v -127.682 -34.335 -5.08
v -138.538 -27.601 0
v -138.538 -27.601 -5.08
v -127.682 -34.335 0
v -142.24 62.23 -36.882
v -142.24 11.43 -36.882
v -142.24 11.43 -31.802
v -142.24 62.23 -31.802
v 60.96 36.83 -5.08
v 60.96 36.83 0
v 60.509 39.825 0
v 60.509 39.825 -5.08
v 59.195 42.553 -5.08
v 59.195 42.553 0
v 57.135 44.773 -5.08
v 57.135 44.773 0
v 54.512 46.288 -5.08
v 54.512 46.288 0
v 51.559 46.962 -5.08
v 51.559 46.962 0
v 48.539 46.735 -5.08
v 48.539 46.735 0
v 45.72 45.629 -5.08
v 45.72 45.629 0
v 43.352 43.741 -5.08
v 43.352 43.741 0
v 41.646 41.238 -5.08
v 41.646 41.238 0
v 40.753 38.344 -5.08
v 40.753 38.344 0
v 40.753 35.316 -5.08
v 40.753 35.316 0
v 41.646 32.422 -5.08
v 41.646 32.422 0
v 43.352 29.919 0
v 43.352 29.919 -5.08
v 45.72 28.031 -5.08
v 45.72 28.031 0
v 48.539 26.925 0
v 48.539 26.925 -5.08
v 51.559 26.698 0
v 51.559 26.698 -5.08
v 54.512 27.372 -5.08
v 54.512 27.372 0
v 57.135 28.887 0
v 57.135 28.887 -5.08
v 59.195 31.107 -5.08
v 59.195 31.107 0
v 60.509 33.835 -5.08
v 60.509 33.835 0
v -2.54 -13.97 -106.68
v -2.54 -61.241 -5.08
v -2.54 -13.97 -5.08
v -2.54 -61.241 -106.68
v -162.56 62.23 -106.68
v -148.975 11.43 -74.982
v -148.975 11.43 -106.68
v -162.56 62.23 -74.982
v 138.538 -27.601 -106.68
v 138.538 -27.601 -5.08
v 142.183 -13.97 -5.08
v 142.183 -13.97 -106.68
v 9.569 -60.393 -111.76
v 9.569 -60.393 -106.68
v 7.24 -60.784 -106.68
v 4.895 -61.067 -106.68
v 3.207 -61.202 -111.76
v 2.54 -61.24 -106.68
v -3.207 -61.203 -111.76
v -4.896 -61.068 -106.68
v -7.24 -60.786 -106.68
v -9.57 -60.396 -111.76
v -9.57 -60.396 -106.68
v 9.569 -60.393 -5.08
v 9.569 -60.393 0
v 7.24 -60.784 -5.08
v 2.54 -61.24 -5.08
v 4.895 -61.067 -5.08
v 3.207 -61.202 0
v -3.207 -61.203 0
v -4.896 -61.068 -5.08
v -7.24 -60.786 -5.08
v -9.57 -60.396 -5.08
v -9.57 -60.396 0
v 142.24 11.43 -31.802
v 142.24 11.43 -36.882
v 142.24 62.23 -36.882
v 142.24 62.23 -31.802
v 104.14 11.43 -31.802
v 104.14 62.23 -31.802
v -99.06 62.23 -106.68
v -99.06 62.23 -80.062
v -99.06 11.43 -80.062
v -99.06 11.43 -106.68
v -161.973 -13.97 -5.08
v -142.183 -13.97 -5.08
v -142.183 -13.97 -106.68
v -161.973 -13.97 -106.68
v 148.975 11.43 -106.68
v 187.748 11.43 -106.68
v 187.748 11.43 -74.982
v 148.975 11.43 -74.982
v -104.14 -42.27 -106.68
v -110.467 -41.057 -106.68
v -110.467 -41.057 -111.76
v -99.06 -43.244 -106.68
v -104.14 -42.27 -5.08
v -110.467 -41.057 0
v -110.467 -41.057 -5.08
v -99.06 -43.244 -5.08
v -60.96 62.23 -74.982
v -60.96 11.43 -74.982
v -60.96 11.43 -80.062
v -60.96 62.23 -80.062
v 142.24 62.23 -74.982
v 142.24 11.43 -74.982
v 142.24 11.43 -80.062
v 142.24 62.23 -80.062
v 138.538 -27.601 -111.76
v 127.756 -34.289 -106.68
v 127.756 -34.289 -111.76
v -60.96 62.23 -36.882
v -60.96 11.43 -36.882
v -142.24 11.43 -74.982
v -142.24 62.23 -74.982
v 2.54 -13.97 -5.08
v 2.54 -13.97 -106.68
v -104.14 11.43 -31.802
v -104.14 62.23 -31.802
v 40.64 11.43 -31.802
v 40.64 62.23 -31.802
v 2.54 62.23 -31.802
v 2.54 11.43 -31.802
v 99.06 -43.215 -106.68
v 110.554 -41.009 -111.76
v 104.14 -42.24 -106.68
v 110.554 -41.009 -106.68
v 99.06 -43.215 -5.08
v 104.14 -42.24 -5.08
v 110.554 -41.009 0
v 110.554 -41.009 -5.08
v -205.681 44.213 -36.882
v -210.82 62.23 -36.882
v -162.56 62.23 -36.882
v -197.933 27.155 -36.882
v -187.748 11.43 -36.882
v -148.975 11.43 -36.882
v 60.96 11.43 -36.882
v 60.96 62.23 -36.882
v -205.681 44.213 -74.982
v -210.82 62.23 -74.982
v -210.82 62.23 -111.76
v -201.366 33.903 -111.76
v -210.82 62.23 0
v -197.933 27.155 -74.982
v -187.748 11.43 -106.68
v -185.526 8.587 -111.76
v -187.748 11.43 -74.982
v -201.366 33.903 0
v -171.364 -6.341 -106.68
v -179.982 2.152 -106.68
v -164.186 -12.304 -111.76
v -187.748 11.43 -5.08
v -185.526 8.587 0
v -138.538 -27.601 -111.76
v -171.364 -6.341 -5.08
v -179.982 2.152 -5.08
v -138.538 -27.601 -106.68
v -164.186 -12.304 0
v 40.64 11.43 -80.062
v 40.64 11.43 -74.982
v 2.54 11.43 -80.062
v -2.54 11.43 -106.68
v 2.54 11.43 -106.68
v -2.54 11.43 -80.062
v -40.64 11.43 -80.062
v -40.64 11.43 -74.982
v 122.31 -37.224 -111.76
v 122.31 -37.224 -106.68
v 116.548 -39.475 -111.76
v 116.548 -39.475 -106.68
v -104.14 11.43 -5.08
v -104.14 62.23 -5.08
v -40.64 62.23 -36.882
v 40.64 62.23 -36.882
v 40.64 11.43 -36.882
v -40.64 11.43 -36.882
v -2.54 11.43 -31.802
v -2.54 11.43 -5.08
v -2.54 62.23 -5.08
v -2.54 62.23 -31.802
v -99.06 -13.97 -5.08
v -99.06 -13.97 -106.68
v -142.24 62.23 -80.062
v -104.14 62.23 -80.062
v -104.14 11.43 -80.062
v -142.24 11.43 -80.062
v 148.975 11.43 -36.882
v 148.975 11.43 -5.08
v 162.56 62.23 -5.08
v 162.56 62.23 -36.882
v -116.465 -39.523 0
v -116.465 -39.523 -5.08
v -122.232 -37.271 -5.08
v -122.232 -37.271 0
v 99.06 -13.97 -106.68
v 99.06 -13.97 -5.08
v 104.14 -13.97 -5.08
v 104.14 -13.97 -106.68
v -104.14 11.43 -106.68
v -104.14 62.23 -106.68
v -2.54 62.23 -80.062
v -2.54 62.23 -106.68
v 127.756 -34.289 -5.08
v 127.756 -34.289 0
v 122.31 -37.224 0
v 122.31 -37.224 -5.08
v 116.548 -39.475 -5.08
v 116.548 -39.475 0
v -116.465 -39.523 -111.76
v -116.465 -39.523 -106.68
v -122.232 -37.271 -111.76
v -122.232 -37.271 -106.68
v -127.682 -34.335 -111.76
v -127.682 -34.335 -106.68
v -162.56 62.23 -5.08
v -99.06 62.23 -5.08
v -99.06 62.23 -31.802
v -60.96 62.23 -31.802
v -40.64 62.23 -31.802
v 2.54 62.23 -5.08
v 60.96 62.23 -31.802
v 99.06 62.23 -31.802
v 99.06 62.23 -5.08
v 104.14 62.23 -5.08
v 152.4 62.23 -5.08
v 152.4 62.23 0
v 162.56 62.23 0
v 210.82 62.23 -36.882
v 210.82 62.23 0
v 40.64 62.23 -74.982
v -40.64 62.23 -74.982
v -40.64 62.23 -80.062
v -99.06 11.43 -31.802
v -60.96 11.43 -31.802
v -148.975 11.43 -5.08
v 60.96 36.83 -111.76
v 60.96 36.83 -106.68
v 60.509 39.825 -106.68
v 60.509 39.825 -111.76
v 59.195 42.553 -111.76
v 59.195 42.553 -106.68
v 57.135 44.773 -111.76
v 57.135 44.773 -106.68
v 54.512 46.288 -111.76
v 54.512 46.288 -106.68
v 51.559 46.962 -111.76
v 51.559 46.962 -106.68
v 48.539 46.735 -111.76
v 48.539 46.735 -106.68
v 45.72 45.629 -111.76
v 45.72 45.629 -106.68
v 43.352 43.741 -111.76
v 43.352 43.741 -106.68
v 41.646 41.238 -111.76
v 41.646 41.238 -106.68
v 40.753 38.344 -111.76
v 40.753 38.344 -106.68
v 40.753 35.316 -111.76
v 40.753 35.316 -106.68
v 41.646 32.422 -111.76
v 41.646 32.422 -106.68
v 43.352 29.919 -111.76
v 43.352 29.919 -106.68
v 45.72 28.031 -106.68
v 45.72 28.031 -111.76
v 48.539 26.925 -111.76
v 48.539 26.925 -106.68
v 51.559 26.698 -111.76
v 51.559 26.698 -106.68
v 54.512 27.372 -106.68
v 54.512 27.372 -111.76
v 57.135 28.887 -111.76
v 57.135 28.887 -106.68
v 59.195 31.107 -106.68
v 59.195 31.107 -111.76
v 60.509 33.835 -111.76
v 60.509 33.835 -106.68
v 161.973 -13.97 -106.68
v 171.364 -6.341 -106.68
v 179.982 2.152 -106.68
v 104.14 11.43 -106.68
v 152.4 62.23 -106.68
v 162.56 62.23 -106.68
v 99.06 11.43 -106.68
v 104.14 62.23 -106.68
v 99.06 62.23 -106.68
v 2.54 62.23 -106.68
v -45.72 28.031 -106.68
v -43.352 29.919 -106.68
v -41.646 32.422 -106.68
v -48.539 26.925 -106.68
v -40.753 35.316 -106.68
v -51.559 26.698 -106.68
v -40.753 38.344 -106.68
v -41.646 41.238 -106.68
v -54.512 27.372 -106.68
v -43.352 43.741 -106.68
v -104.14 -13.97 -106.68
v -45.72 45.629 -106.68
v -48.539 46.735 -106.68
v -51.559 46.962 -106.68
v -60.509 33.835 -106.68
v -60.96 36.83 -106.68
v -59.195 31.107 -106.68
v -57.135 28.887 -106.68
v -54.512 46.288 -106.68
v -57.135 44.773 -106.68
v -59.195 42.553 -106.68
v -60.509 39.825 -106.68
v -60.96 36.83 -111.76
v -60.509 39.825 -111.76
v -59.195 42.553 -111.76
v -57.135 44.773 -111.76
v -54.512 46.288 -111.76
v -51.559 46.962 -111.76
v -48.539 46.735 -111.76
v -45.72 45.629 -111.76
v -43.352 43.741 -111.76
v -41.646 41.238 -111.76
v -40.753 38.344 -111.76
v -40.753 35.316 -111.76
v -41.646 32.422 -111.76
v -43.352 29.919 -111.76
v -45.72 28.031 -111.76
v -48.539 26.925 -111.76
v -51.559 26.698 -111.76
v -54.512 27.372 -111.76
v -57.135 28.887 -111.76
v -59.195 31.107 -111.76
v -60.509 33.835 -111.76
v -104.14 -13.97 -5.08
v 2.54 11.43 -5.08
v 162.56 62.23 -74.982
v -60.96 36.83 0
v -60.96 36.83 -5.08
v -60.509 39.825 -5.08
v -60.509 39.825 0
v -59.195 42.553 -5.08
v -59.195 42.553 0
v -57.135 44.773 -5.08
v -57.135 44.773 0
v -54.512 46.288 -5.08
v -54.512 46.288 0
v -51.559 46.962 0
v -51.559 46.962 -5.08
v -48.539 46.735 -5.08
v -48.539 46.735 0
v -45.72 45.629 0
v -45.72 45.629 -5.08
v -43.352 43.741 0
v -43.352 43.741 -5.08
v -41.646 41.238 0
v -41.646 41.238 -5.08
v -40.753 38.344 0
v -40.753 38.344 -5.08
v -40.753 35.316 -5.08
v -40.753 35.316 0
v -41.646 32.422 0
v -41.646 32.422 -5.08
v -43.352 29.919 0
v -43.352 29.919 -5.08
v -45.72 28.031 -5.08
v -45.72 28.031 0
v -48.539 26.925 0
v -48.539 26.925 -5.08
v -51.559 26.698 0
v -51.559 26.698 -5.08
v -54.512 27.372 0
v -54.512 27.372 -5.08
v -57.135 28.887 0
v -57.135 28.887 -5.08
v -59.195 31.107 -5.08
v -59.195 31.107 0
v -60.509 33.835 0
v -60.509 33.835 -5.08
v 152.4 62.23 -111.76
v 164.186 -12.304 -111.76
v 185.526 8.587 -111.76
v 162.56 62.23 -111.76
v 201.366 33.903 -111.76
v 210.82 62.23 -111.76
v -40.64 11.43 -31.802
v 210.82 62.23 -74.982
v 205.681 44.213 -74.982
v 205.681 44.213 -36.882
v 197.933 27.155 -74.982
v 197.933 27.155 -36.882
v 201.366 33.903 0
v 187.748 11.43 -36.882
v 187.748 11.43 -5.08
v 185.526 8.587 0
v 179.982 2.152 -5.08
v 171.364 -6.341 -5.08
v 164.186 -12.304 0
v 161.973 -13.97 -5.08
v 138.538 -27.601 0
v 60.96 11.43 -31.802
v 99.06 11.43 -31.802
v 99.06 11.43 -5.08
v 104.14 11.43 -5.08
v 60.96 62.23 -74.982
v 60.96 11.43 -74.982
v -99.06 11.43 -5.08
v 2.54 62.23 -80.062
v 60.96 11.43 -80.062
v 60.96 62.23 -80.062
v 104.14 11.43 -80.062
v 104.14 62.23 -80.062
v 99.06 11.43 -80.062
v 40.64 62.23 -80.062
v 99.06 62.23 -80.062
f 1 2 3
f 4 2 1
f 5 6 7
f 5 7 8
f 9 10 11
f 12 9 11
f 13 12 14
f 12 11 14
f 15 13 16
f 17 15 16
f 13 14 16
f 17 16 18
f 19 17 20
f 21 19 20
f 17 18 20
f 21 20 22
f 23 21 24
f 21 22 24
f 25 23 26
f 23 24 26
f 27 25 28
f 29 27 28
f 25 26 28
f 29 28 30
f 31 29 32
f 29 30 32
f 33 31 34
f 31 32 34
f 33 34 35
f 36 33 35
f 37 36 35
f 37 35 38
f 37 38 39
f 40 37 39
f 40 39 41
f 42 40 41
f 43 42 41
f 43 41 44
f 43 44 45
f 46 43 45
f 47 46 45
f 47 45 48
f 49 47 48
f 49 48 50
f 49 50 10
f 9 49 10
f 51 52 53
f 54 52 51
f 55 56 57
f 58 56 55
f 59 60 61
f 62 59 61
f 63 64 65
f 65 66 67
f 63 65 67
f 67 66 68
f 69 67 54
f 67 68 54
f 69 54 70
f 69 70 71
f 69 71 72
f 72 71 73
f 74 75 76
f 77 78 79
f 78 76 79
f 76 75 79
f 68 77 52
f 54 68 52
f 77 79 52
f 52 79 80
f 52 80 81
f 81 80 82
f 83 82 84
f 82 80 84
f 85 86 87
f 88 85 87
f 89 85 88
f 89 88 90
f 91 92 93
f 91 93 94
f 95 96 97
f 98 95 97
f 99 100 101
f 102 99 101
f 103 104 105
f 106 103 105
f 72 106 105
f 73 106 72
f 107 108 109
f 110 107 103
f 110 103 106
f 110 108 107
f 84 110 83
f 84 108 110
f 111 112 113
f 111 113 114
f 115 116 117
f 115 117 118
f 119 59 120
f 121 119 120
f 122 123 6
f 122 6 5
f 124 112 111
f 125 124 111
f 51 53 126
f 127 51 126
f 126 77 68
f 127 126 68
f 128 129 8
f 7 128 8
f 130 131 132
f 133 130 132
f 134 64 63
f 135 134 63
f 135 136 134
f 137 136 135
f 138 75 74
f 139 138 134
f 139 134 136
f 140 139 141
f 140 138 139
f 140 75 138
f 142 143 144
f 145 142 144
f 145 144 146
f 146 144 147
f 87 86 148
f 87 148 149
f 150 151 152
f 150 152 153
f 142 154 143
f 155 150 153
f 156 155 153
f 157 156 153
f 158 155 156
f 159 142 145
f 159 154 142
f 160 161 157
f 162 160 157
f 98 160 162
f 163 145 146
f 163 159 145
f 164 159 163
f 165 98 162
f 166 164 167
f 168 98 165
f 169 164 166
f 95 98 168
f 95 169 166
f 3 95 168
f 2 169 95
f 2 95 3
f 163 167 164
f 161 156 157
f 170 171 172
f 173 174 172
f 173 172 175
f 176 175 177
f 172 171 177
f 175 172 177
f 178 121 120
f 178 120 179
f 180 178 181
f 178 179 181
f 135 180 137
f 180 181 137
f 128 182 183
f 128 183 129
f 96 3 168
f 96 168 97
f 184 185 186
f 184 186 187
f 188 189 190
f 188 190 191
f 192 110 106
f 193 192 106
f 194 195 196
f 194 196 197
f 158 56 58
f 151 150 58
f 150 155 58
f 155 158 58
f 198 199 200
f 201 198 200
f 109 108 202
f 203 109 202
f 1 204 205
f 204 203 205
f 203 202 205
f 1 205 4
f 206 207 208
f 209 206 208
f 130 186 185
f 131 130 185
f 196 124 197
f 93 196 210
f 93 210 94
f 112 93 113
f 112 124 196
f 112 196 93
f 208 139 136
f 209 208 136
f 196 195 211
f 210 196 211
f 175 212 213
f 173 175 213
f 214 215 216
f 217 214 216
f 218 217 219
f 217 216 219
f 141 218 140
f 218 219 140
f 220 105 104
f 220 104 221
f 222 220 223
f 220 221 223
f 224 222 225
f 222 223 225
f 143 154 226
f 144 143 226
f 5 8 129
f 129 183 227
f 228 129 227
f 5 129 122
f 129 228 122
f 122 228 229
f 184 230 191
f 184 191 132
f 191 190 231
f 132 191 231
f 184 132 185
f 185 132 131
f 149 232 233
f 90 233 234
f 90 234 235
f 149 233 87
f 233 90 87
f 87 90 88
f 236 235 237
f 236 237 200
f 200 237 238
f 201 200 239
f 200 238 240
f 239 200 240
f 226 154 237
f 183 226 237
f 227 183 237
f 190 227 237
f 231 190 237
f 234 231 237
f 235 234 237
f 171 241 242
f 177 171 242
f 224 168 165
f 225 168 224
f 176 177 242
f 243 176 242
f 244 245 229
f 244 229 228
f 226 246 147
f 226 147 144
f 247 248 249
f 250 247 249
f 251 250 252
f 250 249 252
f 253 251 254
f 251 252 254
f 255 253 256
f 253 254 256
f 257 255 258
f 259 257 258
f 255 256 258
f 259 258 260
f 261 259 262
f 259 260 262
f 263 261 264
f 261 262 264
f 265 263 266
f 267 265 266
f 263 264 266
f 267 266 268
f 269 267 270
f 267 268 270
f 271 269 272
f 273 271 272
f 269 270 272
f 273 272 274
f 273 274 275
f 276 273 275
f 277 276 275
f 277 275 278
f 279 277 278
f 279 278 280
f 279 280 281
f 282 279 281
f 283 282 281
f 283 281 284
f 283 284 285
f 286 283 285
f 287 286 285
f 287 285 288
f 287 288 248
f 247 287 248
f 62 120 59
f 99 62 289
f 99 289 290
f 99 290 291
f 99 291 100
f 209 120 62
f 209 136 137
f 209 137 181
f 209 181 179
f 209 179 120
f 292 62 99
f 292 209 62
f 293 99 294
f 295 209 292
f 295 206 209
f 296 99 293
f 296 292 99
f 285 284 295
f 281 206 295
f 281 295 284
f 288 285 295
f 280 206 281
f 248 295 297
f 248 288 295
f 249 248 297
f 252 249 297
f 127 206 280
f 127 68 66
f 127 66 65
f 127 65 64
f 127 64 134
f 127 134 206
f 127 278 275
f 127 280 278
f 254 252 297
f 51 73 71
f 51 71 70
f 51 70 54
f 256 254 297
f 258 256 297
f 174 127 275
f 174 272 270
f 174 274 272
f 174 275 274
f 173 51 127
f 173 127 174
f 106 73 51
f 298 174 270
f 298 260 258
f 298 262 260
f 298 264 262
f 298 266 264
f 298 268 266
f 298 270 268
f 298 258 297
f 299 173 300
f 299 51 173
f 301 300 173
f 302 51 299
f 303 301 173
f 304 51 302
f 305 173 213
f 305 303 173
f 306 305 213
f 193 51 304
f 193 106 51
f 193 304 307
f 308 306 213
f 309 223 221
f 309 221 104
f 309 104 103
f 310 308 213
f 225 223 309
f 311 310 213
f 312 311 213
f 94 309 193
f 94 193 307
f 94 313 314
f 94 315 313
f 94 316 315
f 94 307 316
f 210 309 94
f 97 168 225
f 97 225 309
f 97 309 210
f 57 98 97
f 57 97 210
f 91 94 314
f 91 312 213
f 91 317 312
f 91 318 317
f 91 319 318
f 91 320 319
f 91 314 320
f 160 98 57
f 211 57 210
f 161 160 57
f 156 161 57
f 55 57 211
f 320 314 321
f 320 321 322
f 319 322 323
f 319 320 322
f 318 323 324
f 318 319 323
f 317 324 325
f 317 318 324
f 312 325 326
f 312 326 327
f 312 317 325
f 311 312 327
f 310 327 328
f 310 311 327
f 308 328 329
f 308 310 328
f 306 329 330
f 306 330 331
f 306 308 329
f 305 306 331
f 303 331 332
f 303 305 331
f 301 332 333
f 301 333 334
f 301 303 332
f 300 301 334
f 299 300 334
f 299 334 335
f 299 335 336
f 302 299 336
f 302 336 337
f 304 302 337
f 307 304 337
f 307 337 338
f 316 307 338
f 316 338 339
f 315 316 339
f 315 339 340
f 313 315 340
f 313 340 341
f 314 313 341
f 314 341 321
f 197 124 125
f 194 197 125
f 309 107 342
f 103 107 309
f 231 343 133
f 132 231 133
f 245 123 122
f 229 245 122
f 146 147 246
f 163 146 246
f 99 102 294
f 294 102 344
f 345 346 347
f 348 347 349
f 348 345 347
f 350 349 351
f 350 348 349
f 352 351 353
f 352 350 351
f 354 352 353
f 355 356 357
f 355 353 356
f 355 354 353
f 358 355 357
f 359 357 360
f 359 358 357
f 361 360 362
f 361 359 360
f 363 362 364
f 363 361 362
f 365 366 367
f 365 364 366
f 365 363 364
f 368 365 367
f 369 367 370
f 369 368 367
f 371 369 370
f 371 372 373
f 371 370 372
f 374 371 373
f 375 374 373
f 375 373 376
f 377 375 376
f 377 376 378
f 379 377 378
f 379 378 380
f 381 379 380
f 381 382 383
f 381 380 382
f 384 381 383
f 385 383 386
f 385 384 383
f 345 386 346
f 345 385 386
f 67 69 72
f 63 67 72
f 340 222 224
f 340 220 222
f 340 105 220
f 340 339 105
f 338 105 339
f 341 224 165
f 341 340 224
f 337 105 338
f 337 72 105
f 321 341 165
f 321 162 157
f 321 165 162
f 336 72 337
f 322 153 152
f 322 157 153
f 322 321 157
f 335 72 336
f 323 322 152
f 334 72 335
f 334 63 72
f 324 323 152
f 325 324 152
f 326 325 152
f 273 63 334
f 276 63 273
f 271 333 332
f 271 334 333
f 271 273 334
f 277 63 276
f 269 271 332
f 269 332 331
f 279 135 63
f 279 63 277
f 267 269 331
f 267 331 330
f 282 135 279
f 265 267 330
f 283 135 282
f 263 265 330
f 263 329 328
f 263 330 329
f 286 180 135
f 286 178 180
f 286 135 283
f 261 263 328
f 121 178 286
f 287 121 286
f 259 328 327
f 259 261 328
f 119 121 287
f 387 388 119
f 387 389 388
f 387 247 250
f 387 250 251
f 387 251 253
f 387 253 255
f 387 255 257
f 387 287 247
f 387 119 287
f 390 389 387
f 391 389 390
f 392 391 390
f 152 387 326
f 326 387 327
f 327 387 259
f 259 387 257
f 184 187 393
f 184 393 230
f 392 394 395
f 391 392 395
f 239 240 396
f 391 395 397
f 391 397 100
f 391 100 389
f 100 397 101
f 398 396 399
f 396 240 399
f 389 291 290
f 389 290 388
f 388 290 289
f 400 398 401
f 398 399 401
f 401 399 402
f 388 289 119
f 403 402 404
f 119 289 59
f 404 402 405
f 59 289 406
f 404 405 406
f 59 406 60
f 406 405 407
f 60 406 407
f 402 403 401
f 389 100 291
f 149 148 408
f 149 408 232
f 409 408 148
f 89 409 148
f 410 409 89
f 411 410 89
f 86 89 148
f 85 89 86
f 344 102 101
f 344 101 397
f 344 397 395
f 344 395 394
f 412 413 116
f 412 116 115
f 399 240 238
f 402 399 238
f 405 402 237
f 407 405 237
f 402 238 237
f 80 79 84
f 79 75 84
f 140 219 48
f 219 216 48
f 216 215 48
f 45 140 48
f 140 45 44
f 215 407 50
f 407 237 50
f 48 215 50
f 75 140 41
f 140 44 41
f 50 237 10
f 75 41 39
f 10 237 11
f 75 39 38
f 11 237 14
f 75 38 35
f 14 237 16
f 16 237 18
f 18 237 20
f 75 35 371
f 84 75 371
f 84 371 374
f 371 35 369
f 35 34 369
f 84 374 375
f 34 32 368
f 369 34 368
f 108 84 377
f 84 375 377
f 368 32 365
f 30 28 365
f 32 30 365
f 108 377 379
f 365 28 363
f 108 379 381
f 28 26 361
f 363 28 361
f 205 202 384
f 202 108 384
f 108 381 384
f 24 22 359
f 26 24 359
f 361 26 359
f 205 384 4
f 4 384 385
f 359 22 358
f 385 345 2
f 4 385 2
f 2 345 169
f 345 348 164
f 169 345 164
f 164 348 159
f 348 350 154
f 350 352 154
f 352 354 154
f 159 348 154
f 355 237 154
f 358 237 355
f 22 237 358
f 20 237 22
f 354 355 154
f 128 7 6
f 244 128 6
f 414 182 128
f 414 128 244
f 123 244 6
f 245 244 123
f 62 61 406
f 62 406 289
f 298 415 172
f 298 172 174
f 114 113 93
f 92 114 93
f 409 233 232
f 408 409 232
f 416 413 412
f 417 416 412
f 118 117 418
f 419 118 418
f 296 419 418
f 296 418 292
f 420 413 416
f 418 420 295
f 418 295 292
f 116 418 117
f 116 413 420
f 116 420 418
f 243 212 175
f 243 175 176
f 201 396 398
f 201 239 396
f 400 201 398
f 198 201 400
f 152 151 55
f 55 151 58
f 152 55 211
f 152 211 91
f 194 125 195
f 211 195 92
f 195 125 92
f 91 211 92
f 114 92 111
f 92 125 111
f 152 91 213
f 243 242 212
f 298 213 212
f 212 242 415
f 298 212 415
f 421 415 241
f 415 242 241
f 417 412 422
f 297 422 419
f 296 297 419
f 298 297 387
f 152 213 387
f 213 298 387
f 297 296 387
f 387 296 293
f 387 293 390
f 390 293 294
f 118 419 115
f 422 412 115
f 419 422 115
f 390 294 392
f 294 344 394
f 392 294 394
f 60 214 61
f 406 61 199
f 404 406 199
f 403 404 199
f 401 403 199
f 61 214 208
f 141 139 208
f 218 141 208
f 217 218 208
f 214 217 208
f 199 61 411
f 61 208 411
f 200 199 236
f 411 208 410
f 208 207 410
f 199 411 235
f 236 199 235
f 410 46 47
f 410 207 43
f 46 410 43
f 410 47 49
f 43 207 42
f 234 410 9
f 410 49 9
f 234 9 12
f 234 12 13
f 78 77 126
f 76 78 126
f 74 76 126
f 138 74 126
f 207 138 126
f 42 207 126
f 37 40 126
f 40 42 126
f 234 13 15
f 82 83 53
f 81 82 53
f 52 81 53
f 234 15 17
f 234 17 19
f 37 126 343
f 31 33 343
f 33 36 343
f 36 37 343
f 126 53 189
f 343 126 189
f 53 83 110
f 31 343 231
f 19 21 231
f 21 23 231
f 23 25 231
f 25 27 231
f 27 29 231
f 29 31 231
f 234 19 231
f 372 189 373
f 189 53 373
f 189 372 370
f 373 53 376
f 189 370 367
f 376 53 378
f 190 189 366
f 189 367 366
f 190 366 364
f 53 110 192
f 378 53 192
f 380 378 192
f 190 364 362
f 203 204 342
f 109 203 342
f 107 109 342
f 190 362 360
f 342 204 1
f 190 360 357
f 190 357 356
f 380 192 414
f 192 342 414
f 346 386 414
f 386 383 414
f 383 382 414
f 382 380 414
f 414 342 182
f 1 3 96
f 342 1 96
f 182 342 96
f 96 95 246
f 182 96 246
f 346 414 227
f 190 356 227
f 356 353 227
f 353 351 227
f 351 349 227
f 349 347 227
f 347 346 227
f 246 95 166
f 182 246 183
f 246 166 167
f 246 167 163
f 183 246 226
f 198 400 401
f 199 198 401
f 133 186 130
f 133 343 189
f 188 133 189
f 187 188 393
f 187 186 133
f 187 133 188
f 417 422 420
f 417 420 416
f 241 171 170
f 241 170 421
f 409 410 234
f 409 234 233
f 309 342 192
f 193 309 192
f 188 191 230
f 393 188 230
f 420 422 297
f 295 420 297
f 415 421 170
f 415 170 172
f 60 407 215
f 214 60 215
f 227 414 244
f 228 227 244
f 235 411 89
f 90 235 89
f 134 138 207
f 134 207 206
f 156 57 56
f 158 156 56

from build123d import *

# Parameters (mm, degrees)
BOSS_EXTRUDE1_DEPTH                 = 111.76
SKETCH5_W                           = 304.8
SKETCH5_H                           = 25.4
CUT_EXTRUDE3_DEPTH                  = 101.6
CUT_EXTRUDE4_DEPTH                  = 227.288199427
CUT_EXTRUDE4_DEPTH_BACK             = 227.288199427
SKETCH3_W                           = 96.52
SKETCH3_H                           = 101.6
SKETCH3_W_2                         = 48.26
CUT_EXTRUDE5_REACH                  = 288.663
SKETCH6_W                           = 38.1
SKETCH6_H                           = 50.8
SKETCH7_W                           = 81.28
SKETCH7_H                           = 50.8
BOSS_EXTRUDE2_DEPTH                 = 5.08
CUT_EXTRUDE6_REACH                  = 200.969
SKETCH8_R                           = 10.16
SKETCH9_W                           = 5.08
SKETCH9_H                           = 95.25
BOSS_EXTRUDE3_DEPTH                 = 10.16
SKETCH10_W                          = 5.08
SKETCH10_H                          = 95.206439839
BOSS_EXTRUDE4_DEPTH                 = 10.16
CUT_EXTRUDE7_REACH                  = 208.854
FILLET1_R                           = 50.8
BOSS_EXTRUDE5_REACH                 = 208.854
CUT_EXTRUDE8_REACH                  = 248.593
CUT_EXTRUDE8_END_RADIUS             = 126.32098656
CUT_EXTRUDE8_DIRECTION_2_REACH      = 248.593
CUT_EXTRUDE8_DIRECTION_2_END_RADIUS = 126.32098656


with BuildPart() as part:
    # Sketch1 → Boss-Extrude1 (new body)
    with BuildSketch(Plane.XY):
        Polygon((-152.4, 62.23), (-152.4, -33.02), (0, -62.23), (152.4, -32.976439839), (152.4, 62.23), align=None)
    extrude(amount=-BOSS_EXTRUDE1_DEPTH)

    # Sketch5 → Cut-Extrude3 (cut)
    with BuildSketch(Plane.XY.offset(-5.08)):
        with Locations((0, -1.27)):
            Rectangle(SKETCH5_W, SKETCH5_H)
    extrude(amount=-CUT_EXTRUDE3_DEPTH, mode=Mode.SUBTRACT)

    # Sketch3 → Cut-Extrude4 (cut, two sides: drawn at the far end of the back side and taken through both)
    with BuildSketch(Plane(origin=(0, 62.23, 0), x_dir=(1, 0, 0), z_dir=(0, 1, 0)).offset(-CUT_EXTRUDE4_DEPTH_BACK)):
        with Locations((-50.8, 55.88)):
            Rectangle(SKETCH3_W, SKETCH3_H)
        with Locations((50.8, 55.88)):
            Rectangle(SKETCH3_W, SKETCH3_H)
        with Locations((-128.27, 55.88)):
            Rectangle(SKETCH3_W_2, SKETCH3_H)
        with Locations((128.27, 55.88)):
            Rectangle(SKETCH3_W_2, SKETCH3_H)
    extrude(amount=CUT_EXTRUDE4_DEPTH + CUT_EXTRUDE4_DEPTH_BACK, mode=Mode.SUBTRACT)

    # Cut-Extrude5: up to this face of the body (flat: up to its plane)
    cut_extrude5_end = Plane(part.part.faces().sort_by_distance((104.14, 36.83, -55.88))[0])
    # Sketch6 → Cut-Extrude5 (cut, up to the picked face)
    with BuildSketch(Plane.ZY.offset(104.14), mode=Mode.PRIVATE) as cut_extrude5_sk1:
        with Locations((-55.932057734, 36.83)):
            Rectangle(SKETCH6_W, SKETCH6_H)
    cut_extrude5_tool1 = split(extrude(cut_extrude5_sk1.sketch, amount=-CUT_EXTRUDE5_REACH, mode=Mode.PRIVATE), bisect_by=cut_extrude5_end, keep=Keep.BOTH, mode=Mode.PRIVATE)
    add(cut_extrude5_tool1.solids().sort_by(Axis((-104.14, 36.83, -55.932058), (1, 0, 0)))[0], mode=Mode.SUBTRACT)

    # Sketch7 → Boss-Extrude2 (add)
    with BuildSketch(Plane(origin=(0, 0, -36.882057734), x_dir=(-1, 0, 0), z_dir=(0, 0, -1))):
        with Locations((0, 36.83)):
            Rectangle(SKETCH7_W, SKETCH7_H)
        with Locations((101.6, 36.83)):
            Rectangle(SKETCH7_W, SKETCH7_H)
        with Locations((-101.6, 36.83)):
            Rectangle(SKETCH7_W, SKETCH7_H)
    boss_extrude2 = extrude(amount=-BOSS_EXTRUDE2_DEPTH)

    # Mirror1: Boss-Extrude2 across plane
    add(boss_extrude2.mirror(Plane(origin=(0, 0, -55.932057734), x_dir=(1, 0, 0), z_dir=(0, 0, -1))))

    # Cut-Extrude6: up to this face of the body (flat: up to its plane)
    cut_extrude6_end = Plane(part.part.faces().sort_by_distance((-0.010072712, 6.983811852, -111.76))[0])
    # Sketch8 → Cut-Extrude6 (cut, up to the picked face)
    with BuildSketch(Plane.XY, mode=Mode.PRIVATE) as cut_extrude6_sk1:
        with Locations((50.8, 36.83)):
            Circle(SKETCH8_R)
    cut_extrude6_tool1 = split(extrude(cut_extrude6_sk1.sketch, amount=-CUT_EXTRUDE6_REACH, mode=Mode.PRIVATE), bisect_by=cut_extrude6_end, keep=Keep.BOTH, mode=Mode.PRIVATE)
    cut_extrude6 = cut_extrude6_tool1.solids().sort_by(Axis((50.8, 36.83, 0), (0, 0, -1)))[0]
    add(cut_extrude6, mode=Mode.SUBTRACT)

    # Mirror2: Cut-Extrude6 across plane
    add(cut_extrude6.mirror(Plane(origin=(0, 0, 0), x_dir=(0, 0, 1), z_dir=(1, 0, 0))), mode=Mode.SUBTRACT)

    # Sketch9 → Boss-Extrude3 (add)
    with BuildSketch(Plane.ZY.offset(152.4)):
        with Locations((-109.22, 14.605)):
            Rectangle(SKETCH9_W, SKETCH9_H)
        with Locations((-2.54, 14.605)):
            Rectangle(SKETCH9_W, SKETCH9_H)
    extrude(amount=BOSS_EXTRUDE3_DEPTH)

    # Sketch10 → Boss-Extrude4 (add)
    with BuildSketch(Plane(origin=(152.4, 0, 0), x_dir=(0, 0, -1), z_dir=(1, 0, 0))):
        with Locations((2.54, 14.626780081)):
            Rectangle(SKETCH10_W, SKETCH10_H)
        with Locations((109.22, 14.626780081)):
            Rectangle(SKETCH10_W, SKETCH10_H)
    extrude(amount=BOSS_EXTRUDE4_DEPTH)

    # Cut-Extrude7: up to this face of the body (flat: up to its plane)
    cut_extrude7_end = Plane(part.part.faces().sort_by_distance((-0.011704667, 6.851805545, -111.76))[0])
    # Sketch11 → Cut-Extrude7 (cut, up to the picked face)
    with BuildSketch(Plane.XY, mode=Mode.PRIVATE) as cut_extrude7_sk1:
        Polygon((-162.56, -12.7), (-119.696308585, -39.288207521), (-152.4, -33.02), (-162.56, -33.02), align=None)
    cut_extrude7_tool1 = split(extrude(cut_extrude7_sk1.sketch, amount=-CUT_EXTRUDE7_REACH, mode=Mode.PRIVATE), bisect_by=cut_extrude7_end, keep=Keep.BOTH, mode=Mode.PRIVATE)
    # Sketch11 → Cut-Extrude7 (cut, up to the picked face)
    with BuildSketch(Plane.XY, mode=Mode.PRIVATE) as cut_extrude7_sk2:
        Polygon((152.4, -33.02), (162.56, -33.02), (162.56, -12.7), (119.696308585, -39.288207521), align=None)
    cut_extrude7_tool2 = split(extrude(cut_extrude7_sk2.sketch, amount=-CUT_EXTRUDE7_REACH, mode=Mode.PRIVATE), bisect_by=cut_extrude7_end, keep=Keep.BOTH, mode=Mode.PRIVATE)
    add(cut_extrude7_tool1.solids().sort_by(Axis((-148.539263, -27.801749, 0), (0, 0, -1)))[0], mode=Mode.SUBTRACT)
    add(cut_extrude7_tool2.solids().sort_by(Axis((148.539263, -27.801749, 0), (0, 0, -1)))[0], mode=Mode.SUBTRACT)

    # Fillet1
    # the kernel refuses this fillet: 50.8 mm, written as the material it takes off along each edge
    with BuildSketch(Plane(origin=(-162.56, -12.7, 70.671047804), x_dir=(0.8497897447130388, -0.5271217978613181, 0), z_dir=(0, 0, -1)), Plane(origin=(-162.56, -12.7, -36.008952196), x_dir=(0.8497897447130388, -0.5271217978613181, 0), z_dir=(0, 0, -1)), Plane(origin=(162.56, -12.7, 70.671047804), x_dir=(0, 1, 0), z_dir=(0, 0, -1))) as fillet1_piece_1:
        with BuildLine():
            CenterArc((FILLET1_R * 0.556464943335, -FILLET1_R), FILLET1_R, 90, 58.188808221)
            Line((-FILLET1_R * 0.293324801378, -FILLET1_R * 0.472878202139), (0, 0))
            Line((0, 0), (FILLET1_R * 0.556464943335, 0))
        make_face()
    extrude(amount=146.422095607, mode=Mode.SUBTRACT)
    with BuildSketch(Plane(origin=(-119.696308585, -39.288207521, -83.186546401), x_dir=(0.9821230119270369, -0.18824024395268216, 0), z_dir=(0, 0, -1)), Plane(origin=(-119.696308585, -39.288207521, 23.493453599), x_dir=(0.9821230119270369, -0.18824024395268216, 0), z_dir=(0, 0, -1))) as fillet1_piece_2:
        with BuildLine():
            CenterArc((FILLET1_R * 0.184987823618, -FILLET1_R), FILLET1_R, 90, 20.961087149)
            Line((-FILLET1_R * 0.172745995297, -FILLET1_R * 0.0661764005955), (0, 0))
            Line((0, 0), (FILLET1_R * 0.184987823618, 0))
        make_face()
    extrude(amount=52.066907199, mode=Mode.SUBTRACT)
    with BuildSketch(Plane(origin=(162.56, -12.7, -36.008952196), x_dir=(-0.8497897447130388, -0.5271217978613181, 0), z_dir=(0, 0, -1))) as fillet1_piece_3:
        with BuildLine():
            CenterArc((FILLET1_R * 0.556464943335, FILLET1_R), FILLET1_R, 211.811191779, 58.188808221)
            Line((-FILLET1_R * 0.293324801378, FILLET1_R * 0.472878202139), (0, 0))
            Line((0, 0), (FILLET1_R * 0.556464943335, 0))
        make_face()
    extrude(amount=146.422095607, mode=Mode.SUBTRACT)
    with BuildSketch(Plane(origin=(119.776180176, -39.238663434, 23.475348992), x_dir=(-0.9820710795721669, -0.18851099349363817, 0), z_dir=(0, 0, -1)), Plane(origin=(119.776180176, -39.238663434, -83.204651008), x_dir=(-0.9820710795721669, -0.18851099349363817, 0), z_dir=(0, 0, -1))) as fillet1_piece_4:
        with BuildLine():
            CenterArc((FILLET1_R * 0.184845267653, FILLET1_R), FILLET1_R, 249.054708445, 20.945291555)
            Line((-FILLET1_R * 0.172631096402, FILLET1_R * 0.0660778141933), (0, 0))
            Line((0, 0), (FILLET1_R * 0.184845267653, 0))
        make_face()
    extrude(amount=52.030697984, mode=Mode.SUBTRACT)
    with BuildSketch(Plane(origin=(0, -62.23, 24.359816254), x_dir=(-0.982123011927037, 0.1882402439526816, 0), z_dir=(0, 0, -1))) as fillet1_piece_5:
        with BuildLine():
            CenterArc((FILLET1_R * 0.191809576801, FILLET1_R), FILLET1_R, 248.283995147, 21.716004853)
            Line((-FILLET1_R * 0.178196707507, FILLET1_R * 0.0709707488072), (0, 0))
            Line((0, 0), (FILLET1_R * 0.191809576801, 0))
        make_face()
    extrude(amount=160.479632508, mode=Mode.SUBTRACT)

    # Boss-Extrude5: up to this face of the body (flat: up to its plane)
    boss_extrude5_end = Plane(part.part.faces().sort_by_distance((-0.004823682, 7.831331811, -111.76))[0])
    # Sketch12 → Boss-Extrude5 (add, up to the picked face)
    with BuildSketch(Plane.XY, mode=Mode.PRIVATE) as boss_extrude5_sk1:
        with BuildLine():
            Line((-162.56, 62.23), (-210.82, 62.23))
            ThreePointArc((-210.82, 62.23), (-185.525923559, 8.586514121), (-138.537787331, -27.60089991))
            Line((-138.537787331, -27.60089991), (-162.56, 62.23))
        make_face()
    boss_extrude5_tool1 = split(extrude(boss_extrude5_sk1.sketch, amount=-BOSS_EXTRUDE5_REACH, mode=Mode.PRIVATE), bisect_by=boss_extrude5_end, keep=Keep.BOTH, mode=Mode.PRIVATE)
    # Sketch12 → Boss-Extrude5 (add, up to the picked face)
    with BuildSketch(Plane.XY, mode=Mode.PRIVATE) as boss_extrude5_sk2:
        with BuildLine():
            Line((162.56, 62.23), (210.82, 62.23))
            ThreePointArc((210.82, 62.23), (185.525923559, 8.586514121), (138.537787331, -27.60089991))
            Line((138.537787331, -27.60089991), (162.56, 62.23))
        make_face()
    boss_extrude5_tool2 = split(extrude(boss_extrude5_sk2.sketch, amount=-BOSS_EXTRUDE5_REACH, mode=Mode.PRIVATE), bisect_by=boss_extrude5_end, keep=Keep.BOTH, mode=Mode.PRIVATE)
    add(boss_extrude5_tool1.solids().sort_by(Axis((-173.436994, 26.131053, 0), (0, 0, -1)))[0])
    add(boss_extrude5_tool2.solids().sort_by(Axis((173.436994, 26.131053, 0), (0, 0, -1)))[0])

    # Cut-Extrude8: up to this cylinder (the profile starts inside it)
    cut_extrude8_end = Plane(origin=(-87.109319049, 87.777192878, -55.90231), z_dir=(0, 0, 1)) * Cylinder(CUT_EXTRUDE8_END_RADIUS, 750.827973119, mode=Mode.PRIVATE)
    # Sketch13 → Cut-Extrude8 (cut, up to the surface)
    with BuildSketch(Plane(origin=(0, 0, 0), x_dir=(0, 0, -1), z_dir=(1, 0, 0)), mode=Mode.PRIVATE) as cut_extrude8_sk1:
        Polygon((36.882057734, 62.23), (36.882057734, 11.43), (5.08, 11.43), (5.08, -13.97), (106.68, -13.97), (106.68, 11.43), (74.982057734, 11.43), (74.982057734, 62.23), align=None)
    cut_extrude8_tool1 = extrude(cut_extrude8_sk1.sketch, amount=-CUT_EXTRUDE8_REACH, mode=Mode.PRIVATE) & cut_extrude8_end
    add(cut_extrude8_tool1.solids().sort_by_distance((0, 15.058571, -55.90231))[0], mode=Mode.SUBTRACT)

    # Cut-Extrude8 direction 2: up to this cylinder (the profile starts inside it)
    cut_extrude8_direction_2_end = Plane(origin=(87.109319049, 87.777192878, -55.90231), z_dir=(0, 0, 1)) * Cylinder(CUT_EXTRUDE8_DIRECTION_2_END_RADIUS, 750.827973119, mode=Mode.PRIVATE)
    # Sketch13 → Cut-Extrude8 direction 2 (cut, up to the surface)
    with BuildSketch(Plane(origin=(0, 0, 0), x_dir=(0, 0, -1), z_dir=(1, 0, 0)), mode=Mode.PRIVATE) as cut_extrude8_direction_2_sk1:
        Polygon((36.882057734, 62.23), (36.882057734, 11.43), (5.08, 11.43), (5.08, -13.97), (106.68, -13.97), (106.68, 11.43), (74.982057734, 11.43), (74.982057734, 62.23), align=None)
    cut_extrude8_direction_2_tool1 = extrude(cut_extrude8_direction_2_sk1.sketch, amount=CUT_EXTRUDE8_DIRECTION_2_REACH, mode=Mode.PRIVATE) & cut_extrude8_direction_2_end
    add(cut_extrude8_direction_2_tool1.solids().sort_by_distance((0, 15.058571, -55.90231))[0], mode=Mode.SUBTRACT)


solid = part.part
